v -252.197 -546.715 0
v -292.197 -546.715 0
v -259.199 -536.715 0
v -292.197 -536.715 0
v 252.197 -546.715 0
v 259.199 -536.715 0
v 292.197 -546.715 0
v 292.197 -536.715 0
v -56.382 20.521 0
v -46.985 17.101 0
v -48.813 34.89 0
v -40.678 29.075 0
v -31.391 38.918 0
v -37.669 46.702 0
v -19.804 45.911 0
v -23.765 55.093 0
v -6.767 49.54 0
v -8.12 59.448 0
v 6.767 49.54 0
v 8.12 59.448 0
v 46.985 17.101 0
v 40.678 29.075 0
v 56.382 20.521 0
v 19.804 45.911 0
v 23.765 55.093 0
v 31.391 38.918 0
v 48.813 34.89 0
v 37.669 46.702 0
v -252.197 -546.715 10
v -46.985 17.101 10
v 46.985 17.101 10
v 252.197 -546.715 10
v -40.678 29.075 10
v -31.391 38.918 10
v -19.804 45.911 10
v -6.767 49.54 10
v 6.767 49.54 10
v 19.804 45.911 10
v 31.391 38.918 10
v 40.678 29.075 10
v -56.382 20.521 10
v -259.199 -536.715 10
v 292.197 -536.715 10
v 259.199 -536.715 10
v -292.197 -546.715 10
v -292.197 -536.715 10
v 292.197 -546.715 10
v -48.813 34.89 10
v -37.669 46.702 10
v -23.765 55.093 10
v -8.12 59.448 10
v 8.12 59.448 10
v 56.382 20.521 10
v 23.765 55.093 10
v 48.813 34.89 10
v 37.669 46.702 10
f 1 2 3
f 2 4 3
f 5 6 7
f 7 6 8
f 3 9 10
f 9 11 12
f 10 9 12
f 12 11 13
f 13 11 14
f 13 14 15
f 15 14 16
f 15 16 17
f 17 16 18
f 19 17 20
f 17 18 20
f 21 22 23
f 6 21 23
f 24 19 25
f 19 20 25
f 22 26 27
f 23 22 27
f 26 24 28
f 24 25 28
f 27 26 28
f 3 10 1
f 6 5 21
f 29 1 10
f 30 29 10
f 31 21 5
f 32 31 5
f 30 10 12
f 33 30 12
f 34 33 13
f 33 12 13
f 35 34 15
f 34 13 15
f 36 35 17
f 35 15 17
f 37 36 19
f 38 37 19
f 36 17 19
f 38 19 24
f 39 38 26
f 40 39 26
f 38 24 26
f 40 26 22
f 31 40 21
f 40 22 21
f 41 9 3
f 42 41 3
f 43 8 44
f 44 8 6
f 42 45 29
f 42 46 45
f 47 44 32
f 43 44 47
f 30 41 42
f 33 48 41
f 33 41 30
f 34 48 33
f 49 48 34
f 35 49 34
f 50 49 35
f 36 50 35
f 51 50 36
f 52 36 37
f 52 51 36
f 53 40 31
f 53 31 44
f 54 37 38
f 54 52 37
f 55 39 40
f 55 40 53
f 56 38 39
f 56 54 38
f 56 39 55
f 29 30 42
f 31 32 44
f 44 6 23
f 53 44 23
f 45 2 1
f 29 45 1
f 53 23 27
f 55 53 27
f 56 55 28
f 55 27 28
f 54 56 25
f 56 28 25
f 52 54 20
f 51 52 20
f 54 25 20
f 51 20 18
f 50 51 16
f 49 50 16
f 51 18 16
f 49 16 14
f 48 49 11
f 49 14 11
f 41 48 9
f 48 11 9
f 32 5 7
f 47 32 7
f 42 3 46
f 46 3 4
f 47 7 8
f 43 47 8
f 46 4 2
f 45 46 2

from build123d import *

# Parameters (mm, degrees)
EXTRUDE_1_DEPTH = 10


with BuildPart() as part:
    # Эскиз1 → Бобышка-Вытянуть1 (new body)
    with BuildSketch(Plane.XY):
        with BuildLine():
            Line((-292.196717035, -546.714565305), (-252.196717035, -546.714565305))
            Line((-252.196717035, -546.714565305), (-46.984631039, 17.101007166))
            ThreePointArc((-46.984631039, 17.101007166), (0, 50), (46.984631039, 17.101007166))
            Line((46.984631039, 17.101007166), (252.196717035, -546.714565305))
            Line((252.196717035, -546.714565305), (292.196717035, -546.714565305))
            Line((292.196717035, -546.714565305), (292.196717035, -536.714565305))
            Line((292.196717035, -536.714565305), (259.198792417, -536.714565305))
            Line((259.198792417, -536.714565305), (56.381557247, 20.5212086))
            ThreePointArc((56.381557247, 20.5212086), (0, 60), (-56.381557247, 20.5212086))
            Line((-56.381557247, 20.5212086), (-259.198792417, -536.714565305))
            Line((-259.198792417, -536.714565305), (-292.196717035, -536.714565305))
            Line((-292.196717035, -536.714565305), (-292.196717035, -546.714565305))
        make_face()
    extrude(amount=EXTRUDE_1_DEPTH)


solid = part.part
